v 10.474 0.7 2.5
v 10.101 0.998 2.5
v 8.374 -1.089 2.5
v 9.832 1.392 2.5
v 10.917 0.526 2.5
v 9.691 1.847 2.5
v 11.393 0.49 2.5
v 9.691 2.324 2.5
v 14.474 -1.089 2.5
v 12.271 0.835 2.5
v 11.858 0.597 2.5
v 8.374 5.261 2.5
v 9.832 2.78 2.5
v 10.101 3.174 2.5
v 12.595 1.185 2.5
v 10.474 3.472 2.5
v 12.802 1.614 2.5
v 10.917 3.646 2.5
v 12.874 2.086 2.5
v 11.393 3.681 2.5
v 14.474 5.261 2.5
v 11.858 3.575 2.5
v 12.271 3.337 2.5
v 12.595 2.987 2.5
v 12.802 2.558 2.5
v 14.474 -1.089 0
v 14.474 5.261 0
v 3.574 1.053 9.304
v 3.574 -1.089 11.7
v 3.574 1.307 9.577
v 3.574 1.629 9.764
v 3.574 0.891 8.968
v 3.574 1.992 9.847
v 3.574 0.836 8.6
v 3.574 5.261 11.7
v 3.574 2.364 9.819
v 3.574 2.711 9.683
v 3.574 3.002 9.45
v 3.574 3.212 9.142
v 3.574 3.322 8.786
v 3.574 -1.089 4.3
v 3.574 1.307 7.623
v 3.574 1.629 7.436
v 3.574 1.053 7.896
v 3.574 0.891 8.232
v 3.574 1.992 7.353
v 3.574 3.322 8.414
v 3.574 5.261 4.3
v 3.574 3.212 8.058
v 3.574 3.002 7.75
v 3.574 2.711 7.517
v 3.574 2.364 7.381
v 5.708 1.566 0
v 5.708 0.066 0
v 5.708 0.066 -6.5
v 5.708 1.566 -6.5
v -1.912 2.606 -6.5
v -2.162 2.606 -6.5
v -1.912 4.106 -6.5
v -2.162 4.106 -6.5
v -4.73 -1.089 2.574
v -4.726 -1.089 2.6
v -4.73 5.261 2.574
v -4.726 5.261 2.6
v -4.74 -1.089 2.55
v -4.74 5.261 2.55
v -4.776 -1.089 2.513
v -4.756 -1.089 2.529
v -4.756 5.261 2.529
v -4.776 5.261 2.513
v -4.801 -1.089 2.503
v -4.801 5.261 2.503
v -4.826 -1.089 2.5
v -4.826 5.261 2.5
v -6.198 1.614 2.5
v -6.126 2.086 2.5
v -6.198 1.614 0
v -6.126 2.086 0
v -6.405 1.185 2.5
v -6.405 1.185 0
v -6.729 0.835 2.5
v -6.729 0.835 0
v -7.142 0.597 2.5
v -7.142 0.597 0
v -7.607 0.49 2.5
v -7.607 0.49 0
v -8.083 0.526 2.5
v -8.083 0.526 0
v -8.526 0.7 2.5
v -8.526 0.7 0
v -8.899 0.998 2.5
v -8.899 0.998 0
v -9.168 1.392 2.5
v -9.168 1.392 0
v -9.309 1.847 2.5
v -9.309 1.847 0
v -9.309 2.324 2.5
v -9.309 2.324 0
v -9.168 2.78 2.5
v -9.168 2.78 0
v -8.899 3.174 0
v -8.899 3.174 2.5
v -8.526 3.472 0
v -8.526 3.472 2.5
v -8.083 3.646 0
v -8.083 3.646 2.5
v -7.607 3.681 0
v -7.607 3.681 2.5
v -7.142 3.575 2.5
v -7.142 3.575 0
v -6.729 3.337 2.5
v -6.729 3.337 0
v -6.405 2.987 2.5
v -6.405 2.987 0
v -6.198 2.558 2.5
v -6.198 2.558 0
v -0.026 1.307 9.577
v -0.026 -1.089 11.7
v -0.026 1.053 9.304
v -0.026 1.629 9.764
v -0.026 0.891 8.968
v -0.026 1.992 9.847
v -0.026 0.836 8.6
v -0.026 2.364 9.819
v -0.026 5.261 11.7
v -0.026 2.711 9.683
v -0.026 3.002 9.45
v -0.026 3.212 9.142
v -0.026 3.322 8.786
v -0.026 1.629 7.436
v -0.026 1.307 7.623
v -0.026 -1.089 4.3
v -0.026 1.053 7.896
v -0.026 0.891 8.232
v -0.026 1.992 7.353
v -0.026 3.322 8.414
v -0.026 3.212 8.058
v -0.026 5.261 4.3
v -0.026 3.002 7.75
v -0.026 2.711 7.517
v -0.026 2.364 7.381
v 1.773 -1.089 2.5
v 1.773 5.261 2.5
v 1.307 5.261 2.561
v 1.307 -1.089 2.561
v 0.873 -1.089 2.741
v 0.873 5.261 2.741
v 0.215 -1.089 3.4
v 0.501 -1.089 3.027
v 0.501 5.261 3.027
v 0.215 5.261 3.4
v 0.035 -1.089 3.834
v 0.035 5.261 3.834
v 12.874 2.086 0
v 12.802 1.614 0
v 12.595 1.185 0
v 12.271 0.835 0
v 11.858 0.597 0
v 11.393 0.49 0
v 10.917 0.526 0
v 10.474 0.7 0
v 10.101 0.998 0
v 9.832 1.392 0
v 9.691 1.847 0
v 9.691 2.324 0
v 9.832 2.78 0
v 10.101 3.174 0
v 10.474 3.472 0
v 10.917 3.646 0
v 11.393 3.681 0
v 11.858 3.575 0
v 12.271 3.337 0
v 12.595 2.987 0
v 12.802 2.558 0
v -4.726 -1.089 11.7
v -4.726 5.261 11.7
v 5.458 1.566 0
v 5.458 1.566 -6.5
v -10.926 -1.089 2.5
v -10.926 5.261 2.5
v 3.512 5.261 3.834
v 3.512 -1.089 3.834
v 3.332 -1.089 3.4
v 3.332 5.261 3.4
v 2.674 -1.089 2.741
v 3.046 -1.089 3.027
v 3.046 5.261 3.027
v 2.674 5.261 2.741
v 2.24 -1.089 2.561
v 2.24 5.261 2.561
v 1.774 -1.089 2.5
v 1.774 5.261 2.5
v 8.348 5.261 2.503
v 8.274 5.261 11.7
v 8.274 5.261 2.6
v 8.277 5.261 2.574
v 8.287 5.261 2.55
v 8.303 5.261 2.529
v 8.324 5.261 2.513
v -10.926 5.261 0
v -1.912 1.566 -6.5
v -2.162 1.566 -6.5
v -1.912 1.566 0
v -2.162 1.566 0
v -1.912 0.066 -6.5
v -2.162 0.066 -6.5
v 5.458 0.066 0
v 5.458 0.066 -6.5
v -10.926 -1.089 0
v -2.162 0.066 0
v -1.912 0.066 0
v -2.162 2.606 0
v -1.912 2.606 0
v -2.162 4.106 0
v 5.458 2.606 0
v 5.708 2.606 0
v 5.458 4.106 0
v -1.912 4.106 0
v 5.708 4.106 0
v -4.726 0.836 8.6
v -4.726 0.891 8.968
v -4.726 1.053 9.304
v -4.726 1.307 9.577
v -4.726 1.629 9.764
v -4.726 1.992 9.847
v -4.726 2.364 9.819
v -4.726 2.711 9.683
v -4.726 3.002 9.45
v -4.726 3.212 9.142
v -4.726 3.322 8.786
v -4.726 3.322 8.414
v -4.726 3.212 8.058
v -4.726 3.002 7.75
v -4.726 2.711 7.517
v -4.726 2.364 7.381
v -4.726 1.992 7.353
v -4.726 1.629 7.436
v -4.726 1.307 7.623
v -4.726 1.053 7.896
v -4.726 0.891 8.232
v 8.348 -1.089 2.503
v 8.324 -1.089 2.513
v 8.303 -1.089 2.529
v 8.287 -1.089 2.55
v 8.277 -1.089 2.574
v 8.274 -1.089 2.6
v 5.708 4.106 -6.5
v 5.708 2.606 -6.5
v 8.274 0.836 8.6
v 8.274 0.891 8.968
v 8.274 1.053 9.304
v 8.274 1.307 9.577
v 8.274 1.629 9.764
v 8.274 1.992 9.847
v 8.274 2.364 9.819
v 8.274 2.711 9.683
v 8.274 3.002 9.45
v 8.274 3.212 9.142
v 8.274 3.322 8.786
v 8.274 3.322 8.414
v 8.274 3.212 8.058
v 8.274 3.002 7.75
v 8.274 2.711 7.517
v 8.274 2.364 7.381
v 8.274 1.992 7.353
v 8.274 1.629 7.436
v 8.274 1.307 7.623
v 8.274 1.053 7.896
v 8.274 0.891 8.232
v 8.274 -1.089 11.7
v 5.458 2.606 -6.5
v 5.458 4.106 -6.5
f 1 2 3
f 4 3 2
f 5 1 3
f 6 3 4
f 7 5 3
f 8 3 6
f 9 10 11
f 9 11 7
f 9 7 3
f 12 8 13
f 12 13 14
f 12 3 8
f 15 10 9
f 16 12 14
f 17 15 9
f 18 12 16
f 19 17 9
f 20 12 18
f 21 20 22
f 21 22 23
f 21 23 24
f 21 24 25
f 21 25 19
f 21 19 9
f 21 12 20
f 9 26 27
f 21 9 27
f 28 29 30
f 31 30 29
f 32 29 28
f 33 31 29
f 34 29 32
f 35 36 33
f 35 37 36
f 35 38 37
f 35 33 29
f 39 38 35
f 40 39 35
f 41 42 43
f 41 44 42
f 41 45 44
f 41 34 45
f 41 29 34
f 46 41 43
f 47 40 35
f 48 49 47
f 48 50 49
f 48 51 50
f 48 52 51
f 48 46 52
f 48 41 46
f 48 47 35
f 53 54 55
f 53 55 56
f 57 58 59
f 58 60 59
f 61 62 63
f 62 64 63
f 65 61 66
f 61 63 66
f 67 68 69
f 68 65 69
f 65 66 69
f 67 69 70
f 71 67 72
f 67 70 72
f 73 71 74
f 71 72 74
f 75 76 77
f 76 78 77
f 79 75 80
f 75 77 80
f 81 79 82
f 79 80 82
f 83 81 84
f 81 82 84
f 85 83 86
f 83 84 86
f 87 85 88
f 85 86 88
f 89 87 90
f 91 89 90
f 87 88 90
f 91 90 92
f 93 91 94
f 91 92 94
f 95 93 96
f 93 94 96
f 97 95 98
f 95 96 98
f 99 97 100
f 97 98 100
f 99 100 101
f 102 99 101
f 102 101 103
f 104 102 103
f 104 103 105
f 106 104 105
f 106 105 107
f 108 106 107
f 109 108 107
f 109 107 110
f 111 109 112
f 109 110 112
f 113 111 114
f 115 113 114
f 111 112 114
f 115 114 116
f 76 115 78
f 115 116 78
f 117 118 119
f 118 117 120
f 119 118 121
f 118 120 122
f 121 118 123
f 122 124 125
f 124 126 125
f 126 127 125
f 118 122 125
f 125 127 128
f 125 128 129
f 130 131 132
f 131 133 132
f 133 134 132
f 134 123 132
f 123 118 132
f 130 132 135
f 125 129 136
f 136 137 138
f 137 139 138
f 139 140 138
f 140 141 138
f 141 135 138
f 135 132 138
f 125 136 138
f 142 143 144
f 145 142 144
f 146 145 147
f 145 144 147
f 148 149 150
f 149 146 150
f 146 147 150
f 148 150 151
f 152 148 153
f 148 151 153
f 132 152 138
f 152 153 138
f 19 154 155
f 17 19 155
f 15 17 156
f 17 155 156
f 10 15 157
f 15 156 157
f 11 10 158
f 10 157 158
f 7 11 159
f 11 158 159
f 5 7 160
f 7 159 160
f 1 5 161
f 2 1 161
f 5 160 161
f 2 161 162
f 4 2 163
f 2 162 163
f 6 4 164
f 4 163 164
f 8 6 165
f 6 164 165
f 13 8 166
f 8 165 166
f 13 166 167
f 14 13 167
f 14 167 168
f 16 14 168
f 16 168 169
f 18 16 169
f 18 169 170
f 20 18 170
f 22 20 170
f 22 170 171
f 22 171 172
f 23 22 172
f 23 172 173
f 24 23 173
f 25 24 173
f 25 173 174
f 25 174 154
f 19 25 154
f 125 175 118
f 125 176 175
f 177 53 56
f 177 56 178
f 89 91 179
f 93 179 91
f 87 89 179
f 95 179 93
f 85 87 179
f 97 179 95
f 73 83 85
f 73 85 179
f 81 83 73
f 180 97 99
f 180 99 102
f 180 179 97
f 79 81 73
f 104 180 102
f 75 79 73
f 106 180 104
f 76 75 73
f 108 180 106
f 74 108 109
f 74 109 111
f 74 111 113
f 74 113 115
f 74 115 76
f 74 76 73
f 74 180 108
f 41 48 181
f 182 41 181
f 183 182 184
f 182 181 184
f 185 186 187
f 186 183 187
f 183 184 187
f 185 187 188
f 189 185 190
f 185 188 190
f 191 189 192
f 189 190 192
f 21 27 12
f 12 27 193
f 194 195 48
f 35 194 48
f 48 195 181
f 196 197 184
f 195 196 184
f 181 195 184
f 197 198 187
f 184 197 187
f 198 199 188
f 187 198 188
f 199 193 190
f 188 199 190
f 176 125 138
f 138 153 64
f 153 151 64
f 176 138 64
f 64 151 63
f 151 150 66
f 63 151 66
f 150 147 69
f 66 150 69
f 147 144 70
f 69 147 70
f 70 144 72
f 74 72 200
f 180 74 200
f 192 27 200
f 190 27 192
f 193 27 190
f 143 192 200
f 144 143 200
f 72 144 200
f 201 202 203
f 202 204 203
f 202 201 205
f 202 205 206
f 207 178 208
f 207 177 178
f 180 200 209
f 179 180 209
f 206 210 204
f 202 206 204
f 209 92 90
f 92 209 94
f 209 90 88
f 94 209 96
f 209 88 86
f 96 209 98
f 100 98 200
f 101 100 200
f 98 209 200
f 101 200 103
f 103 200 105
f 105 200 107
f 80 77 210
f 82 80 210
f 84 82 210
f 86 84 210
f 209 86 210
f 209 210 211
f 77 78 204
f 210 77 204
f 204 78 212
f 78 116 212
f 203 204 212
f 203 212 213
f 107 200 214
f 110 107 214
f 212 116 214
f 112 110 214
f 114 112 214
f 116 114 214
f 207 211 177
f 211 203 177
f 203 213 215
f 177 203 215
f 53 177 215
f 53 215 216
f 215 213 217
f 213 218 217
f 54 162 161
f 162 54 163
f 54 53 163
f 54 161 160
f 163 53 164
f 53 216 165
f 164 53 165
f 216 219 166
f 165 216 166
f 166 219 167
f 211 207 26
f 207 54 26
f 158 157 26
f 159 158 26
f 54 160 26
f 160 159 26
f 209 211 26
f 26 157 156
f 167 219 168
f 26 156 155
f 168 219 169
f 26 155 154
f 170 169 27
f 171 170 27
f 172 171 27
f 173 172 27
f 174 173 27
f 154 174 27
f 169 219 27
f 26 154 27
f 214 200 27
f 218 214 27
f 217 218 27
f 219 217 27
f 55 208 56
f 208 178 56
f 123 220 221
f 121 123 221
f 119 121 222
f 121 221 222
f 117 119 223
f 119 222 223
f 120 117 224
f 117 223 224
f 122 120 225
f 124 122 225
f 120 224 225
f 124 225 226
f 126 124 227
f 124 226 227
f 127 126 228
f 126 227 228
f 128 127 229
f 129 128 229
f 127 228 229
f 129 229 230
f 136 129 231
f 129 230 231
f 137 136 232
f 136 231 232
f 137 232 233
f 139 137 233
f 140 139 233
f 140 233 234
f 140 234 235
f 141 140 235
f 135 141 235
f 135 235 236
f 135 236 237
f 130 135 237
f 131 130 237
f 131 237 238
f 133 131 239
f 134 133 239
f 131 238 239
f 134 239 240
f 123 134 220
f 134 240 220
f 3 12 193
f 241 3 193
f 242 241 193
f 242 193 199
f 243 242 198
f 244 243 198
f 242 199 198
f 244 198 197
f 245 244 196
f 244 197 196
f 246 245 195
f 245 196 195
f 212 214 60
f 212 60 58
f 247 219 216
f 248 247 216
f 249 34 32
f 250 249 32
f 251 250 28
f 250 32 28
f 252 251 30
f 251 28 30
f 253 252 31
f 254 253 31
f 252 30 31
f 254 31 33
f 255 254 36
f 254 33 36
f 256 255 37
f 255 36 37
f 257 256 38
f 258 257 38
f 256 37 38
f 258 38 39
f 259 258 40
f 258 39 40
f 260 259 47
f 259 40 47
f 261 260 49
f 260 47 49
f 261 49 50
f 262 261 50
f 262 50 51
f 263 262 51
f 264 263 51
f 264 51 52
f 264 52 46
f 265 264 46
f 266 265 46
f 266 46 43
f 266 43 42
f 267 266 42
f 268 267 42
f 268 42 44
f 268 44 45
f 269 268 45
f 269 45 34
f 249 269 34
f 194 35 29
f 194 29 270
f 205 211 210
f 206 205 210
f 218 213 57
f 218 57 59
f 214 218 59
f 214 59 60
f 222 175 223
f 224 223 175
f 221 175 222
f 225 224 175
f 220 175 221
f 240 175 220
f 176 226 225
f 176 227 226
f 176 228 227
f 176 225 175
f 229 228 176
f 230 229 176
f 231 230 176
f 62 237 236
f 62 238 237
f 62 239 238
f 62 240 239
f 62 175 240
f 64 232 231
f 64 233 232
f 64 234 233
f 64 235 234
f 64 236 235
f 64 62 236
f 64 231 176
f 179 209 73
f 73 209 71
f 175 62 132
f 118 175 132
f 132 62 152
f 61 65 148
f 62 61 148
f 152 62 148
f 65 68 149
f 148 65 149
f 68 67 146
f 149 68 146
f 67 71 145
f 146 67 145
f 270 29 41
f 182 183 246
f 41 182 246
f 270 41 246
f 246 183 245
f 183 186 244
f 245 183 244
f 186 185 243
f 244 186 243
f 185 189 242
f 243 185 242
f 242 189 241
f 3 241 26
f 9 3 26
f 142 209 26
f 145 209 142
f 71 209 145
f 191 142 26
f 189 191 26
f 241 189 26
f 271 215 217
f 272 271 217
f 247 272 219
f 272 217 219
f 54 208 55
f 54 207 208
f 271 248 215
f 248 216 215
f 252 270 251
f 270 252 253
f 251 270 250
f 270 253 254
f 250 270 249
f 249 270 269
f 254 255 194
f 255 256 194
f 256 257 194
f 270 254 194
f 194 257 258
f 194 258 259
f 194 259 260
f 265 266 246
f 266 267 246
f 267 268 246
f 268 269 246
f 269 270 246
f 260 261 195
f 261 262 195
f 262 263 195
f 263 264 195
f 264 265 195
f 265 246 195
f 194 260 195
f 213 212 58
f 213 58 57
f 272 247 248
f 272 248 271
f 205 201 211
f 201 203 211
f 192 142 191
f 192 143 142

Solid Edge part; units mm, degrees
sketch "Sketch1" plane through (0, 0, 0) normal (0, 0, 1) x (1, 0, 0)
  line L0 (-10.9265, -1.0891) -> (14.4735, -1.0891)
  line L1 (14.4735, -1.0891) -> (14.4735, 5.2609)
  line L2 (14.4735, 5.2609) -> (-10.9265, 5.2609)
  line L3 (-10.9265, 5.2609) -> (-10.9265, -1.0891)
  dimension "D1" = 25.4
  dimension "D2" = 6.35
extrude "Protrusion1" add sketch "Sketch1" along normal blind 2.5
sketch "Sketch2" plane through (1.7735, 2.0859, 2.5) normal (0, 0, 1) x (0, 1, 0)
  line L0 (-3.175, -1.8) -> (-3.175, -6.5)
  line L1 (-3.175, -6.5) -> (3.175, -6.5)
  line L2 (3.175, -6.5) -> (3.175, -1.8)
  line L3 (-3.175, -1.8) -> (3.175, -1.8)
  line L4 (3.175, 1.8) -> (3.175, 6.5)
  line L5 (-3.175, 6.5) -> (3.175, 6.5)
  line L6 (-3.175, 6.5) -> (-3.175, 1.8)
  line L7 (-3.175, 1.8) -> (3.175, 1.8)
extrude "ExtrudedProtrusion_2" add sketch "Sketch2" along normal blind 9.2
fillet "Round_1" radius 0.1 2 edges at (-4.7265, 2.0859, 2.5) (8.2735, 2.0859, 2.5)
fillet "Round_2" radius 1.8 2 edges at (-0.0265, 2.0859, 2.5) (3.5735, 2.0859, 2.5)
sketch "Sketch3" plane through (1.7735, 2.0859, 0) normal (0, 0, -1) x (1, 0, 0)
  line L0 (-3.935, 2.02) -> (-3.935, 0.52)
  line L1 (-3.935, 0.52) -> (-3.685, 0.52)
  line L2 (-3.685, 0.52) -> (-3.685, 2.02)
  line L3 (-3.685, 2.02) -> (-3.935, 2.02)
  line L4 (-3.935, -0.52) -> (-3.685, -0.52)
  line L5 (-3.685, -0.52) -> (-3.685, -2.02)
  line L6 (-3.685, -2.02) -> (-3.935, -2.02)
  line L7 (-3.935, -2.02) -> (-3.935, -0.52)
  line L8 (3.935, -2.02) -> (3.935, -0.52)
  line L9 (3.935, -0.52) -> (3.685, -0.52)
  line L10 (3.685, -0.52) -> (3.685, -2.02)
  line L11 (3.685, -2.02) -> (3.935, -2.02)
  line L12 (3.935, 0.52) -> (3.685, 0.52)
  line L13 (3.685, 0.52) -> (3.685, 2.02)
  line L14 (3.685, 2.02) -> (3.935, 2.02)
  line L15 (3.935, 2.02) -> (3.935, 0.52)
extrude "ExtrudedProtrusion_3" add sketch "Sketch3" along normal blind 6.5
sketch "Sketch4" plane through (-4.7265, 2.0859, 8.55) normal (-1, 0, 0) x (0, -1, 0)
  circle A0 centre (0, 0.05) radius 1.25
extrude "Cutout1" cut sketch "Sketch4" against normal through all
sketch "Sketch5" plane through (1.7735, 2.0859, 0) normal (0, 0, -1) x (1, 0, 0)
  circle A0 centre (-9.5, 0) radius 1.6
  circle A1 centre (9.5, 0) radius 1.6
extrude "Cutout2" cut sketch "Sketch5" against normal through all
